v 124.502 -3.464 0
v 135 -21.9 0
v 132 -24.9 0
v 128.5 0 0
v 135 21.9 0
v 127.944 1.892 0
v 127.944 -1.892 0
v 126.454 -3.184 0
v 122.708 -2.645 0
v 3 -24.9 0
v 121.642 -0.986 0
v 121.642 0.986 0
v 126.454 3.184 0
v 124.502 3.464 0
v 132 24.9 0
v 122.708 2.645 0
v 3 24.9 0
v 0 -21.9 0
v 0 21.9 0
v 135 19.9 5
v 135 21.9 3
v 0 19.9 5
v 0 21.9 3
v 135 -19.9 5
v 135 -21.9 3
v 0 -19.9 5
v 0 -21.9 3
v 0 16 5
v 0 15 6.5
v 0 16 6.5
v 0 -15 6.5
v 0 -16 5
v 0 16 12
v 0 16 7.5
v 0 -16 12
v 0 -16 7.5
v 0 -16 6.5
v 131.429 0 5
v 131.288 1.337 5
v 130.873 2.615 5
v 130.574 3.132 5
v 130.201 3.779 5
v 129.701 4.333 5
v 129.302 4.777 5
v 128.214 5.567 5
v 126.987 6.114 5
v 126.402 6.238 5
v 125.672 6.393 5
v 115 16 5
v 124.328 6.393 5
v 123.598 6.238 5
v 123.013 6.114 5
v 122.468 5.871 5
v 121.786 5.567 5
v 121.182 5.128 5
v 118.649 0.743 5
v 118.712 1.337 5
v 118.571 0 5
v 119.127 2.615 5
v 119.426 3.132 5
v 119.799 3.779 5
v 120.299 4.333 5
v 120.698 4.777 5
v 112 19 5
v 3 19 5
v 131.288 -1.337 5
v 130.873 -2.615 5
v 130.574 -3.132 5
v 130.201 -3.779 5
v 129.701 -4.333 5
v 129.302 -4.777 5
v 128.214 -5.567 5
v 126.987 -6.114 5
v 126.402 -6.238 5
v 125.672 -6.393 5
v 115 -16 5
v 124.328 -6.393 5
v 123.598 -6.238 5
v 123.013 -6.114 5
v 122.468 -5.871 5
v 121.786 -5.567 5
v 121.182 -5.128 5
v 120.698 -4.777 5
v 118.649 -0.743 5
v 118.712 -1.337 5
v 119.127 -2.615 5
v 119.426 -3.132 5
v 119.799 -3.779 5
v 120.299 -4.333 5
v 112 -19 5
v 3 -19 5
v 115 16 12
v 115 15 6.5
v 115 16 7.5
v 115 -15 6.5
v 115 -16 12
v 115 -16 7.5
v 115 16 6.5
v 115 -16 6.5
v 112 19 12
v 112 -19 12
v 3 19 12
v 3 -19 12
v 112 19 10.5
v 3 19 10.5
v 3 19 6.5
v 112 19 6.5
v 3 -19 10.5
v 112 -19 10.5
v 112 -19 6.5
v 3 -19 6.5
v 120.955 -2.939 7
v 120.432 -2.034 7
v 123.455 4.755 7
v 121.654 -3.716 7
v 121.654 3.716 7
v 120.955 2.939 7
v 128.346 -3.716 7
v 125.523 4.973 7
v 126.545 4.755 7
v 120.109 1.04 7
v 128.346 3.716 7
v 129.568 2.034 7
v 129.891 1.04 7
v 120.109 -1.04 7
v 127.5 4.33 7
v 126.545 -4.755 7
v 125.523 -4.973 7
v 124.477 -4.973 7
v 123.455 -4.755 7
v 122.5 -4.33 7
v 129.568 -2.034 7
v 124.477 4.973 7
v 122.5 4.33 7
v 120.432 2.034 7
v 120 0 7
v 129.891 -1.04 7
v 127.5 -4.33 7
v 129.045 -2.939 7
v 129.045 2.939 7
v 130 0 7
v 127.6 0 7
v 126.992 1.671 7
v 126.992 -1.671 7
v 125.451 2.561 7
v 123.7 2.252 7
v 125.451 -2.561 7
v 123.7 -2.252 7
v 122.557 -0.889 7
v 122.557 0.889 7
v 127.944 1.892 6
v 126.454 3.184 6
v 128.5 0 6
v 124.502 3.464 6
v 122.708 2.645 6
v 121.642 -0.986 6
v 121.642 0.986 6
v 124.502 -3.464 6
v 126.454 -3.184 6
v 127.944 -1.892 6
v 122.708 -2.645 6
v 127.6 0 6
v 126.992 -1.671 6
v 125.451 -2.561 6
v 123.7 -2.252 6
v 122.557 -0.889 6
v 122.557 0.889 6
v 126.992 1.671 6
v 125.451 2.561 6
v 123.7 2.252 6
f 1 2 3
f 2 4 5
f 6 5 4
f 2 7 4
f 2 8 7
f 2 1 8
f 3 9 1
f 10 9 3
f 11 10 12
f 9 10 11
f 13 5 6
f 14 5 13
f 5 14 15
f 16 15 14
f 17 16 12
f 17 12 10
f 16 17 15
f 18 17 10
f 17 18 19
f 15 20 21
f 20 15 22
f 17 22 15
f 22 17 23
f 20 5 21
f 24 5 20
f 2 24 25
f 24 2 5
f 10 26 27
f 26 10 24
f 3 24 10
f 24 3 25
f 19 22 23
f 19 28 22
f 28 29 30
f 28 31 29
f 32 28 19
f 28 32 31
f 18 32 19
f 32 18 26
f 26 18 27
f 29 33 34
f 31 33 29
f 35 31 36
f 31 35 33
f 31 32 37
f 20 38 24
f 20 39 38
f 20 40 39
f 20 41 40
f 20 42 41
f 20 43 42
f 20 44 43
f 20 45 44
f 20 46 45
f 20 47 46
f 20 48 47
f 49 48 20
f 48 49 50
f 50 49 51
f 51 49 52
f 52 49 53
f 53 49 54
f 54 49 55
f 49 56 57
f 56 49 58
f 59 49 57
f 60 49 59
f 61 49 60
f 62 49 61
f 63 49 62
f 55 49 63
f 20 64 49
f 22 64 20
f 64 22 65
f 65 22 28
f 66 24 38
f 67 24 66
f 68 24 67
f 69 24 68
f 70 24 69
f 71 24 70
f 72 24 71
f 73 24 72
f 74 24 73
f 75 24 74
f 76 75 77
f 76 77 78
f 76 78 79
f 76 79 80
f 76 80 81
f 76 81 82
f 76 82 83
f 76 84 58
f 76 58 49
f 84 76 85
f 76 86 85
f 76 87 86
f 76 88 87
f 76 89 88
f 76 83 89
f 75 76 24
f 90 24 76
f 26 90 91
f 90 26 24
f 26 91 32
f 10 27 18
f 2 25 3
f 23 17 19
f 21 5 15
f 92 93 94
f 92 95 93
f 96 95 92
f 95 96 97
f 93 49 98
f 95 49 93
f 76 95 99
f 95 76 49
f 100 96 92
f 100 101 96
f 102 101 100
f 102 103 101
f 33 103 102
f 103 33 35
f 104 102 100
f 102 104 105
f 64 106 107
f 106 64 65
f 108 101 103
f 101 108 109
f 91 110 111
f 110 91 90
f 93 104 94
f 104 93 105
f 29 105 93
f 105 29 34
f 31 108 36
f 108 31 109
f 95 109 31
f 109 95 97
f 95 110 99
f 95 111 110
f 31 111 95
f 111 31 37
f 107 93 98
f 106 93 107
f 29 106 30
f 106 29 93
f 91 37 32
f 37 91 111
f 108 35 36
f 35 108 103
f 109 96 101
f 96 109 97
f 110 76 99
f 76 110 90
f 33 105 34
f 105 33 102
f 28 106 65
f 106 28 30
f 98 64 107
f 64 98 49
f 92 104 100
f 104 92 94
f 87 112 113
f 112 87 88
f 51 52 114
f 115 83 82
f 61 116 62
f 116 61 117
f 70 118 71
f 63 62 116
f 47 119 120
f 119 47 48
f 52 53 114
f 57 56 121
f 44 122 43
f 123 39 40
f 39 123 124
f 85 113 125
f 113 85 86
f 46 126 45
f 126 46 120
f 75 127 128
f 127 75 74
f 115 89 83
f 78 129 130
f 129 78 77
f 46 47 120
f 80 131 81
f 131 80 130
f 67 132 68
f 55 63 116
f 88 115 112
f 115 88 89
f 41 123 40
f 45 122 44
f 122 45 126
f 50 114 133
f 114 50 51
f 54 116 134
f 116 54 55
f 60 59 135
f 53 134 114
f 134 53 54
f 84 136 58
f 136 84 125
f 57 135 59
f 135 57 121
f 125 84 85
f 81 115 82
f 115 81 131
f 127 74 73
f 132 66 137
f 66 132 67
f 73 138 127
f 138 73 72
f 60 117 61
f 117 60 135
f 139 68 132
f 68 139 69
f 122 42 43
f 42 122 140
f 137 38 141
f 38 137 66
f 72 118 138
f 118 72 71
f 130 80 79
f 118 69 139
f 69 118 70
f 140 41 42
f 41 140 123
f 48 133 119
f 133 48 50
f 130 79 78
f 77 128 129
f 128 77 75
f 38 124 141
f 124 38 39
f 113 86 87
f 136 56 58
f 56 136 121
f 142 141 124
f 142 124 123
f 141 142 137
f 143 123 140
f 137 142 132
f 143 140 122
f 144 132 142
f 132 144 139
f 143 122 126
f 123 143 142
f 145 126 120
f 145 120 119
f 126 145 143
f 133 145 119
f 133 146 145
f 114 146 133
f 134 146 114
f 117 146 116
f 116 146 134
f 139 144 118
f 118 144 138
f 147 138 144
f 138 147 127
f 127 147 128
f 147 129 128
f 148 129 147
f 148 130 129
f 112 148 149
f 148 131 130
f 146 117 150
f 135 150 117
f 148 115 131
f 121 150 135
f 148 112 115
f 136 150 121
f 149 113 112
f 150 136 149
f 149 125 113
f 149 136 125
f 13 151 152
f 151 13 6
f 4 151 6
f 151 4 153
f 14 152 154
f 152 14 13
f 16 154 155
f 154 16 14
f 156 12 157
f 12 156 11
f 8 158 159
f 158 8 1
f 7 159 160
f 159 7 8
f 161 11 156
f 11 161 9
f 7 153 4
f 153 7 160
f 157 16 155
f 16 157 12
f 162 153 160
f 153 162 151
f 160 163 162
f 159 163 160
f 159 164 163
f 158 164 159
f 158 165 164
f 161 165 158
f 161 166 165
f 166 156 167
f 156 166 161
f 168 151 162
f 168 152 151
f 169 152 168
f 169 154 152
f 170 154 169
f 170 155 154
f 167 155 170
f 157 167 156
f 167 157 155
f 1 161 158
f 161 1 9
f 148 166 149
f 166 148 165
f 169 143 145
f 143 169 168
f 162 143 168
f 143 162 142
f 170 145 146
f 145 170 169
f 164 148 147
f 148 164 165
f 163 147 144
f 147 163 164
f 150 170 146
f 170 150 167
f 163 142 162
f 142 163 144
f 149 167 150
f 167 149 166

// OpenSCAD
// file: config_4x5.scad
/*
This is the base configuration file for the 4x5" format
# we are not using the exact ANSI measures, but slightly rounded measures for slight simplification
*/
vStabilizerTotal_h = 7;

// general tolerance
vTolerance = 0.2;

// sheet film and cassette measurements (roughly based on the ANSI measurements)
vFilmSheet_l = 127;
vFilmSheet_w = 102;
vCassette_l = 160; // A min
vCassette_w = 121; // B max
vCassette_h = 13.2; // C max
vLightTrap_l = 2; // M2
vLightTrap_w = vCassette_w;
vLightTrap_h = 1.5; // M1
vLightTrap_offsetX = 141; // G max
vFilmWindow_l = 121;
vFilmWindow_w = 101;
vFilmWindow_offsetX = 16;
vGroundGlass_offsetZ = 5;

// Graflok
vGraflok_h = 6; // this is not the official measurement, just measured from a camera 

// lens board measures (we are using Wista/Technika-style lensboards)
vLensboard_l = 100;
vLensboard_w = 97;
vLensboard_h = 2;
vLensboard_offsetX = -(vLensboard_l+3)/2; // caution: we have an asymetric offset!
vLensboard_offsetY = -vLensboard_w/2;
vLensboardHole_d = 85;
vLensboardLighttrap_d = 89;
vLensboardLighttrap_h = 1+vTolerance;

// bellows frame measures - the bellows frame design is derived from standardcameras.com
// back frame
vBellowsBackInner_l = 144; //???? check and replace with the measurement from your bellows!
vBellowsBackInner_w = vBellowsBackInner_l;
vBellowsBackOuter_l = vBellowsBackInner_l+1;
vBellowsBackOuter_w = vBellowsBackOuter_l;

vBellowsBackFrameOuter_l = 159;
vBellowsBackFrameOuter_w = vBellowsBackFrameOuter_l;
vBellowsBackFrameOuter_h = 7;
vBellowsBackFrameInner_l = 135;
vBellowsBackFrameInner_w = vBellowsBackFrameInner_l;
vBellowsBackFrameInner_h = 5;

vBellowsBackLightTrapOuter_l = vBellowsBackFrameInner_l+2*2;
vBellowsBackLightTrapOuter_w = vBellowsBackLightTrapOuter_l;
vBellowsBackLightTrap_h = 3;

vBellowsBackFrameScrewHole_d = 2;
vBellowsBackFrameScrewHole_h = 10;
vBellowsBackFrameScrewHole_offsetXY = 70;
vBellowsBackFrameScrewHole_offsetZ = vBellowsBackFrameOuter_h/2;

// front frame
vBellowsFrontInner_l = 94; //???? check and replace with the measurement from your bellows!
vBellowsFrontInner_w = vBellowsFrontInner_l;
vBellowsFrontOuter_l = vBellowsFrontInner_l+1;
vBellowsFrontOuter_w = vBellowsFrontOuter_l;

vBellowsFrontFrameOuter_l = 104;
vBellowsFrontFrameOuter_w = vBellowsFrontFrameOuter_l;
vBellowsFrontFrameOuter_h = 7;
vBellowsFrontFrameInner_l = 82;
vBellowsFrontFrameInner_w = vBellowsFrontFrameInner_l;
vBellowsFrontFrameInner_h = 5;

vBellowsFrontLightTrapOuter_l = vBellowsFrontFrameInner_l+2*2;
vBellowsFrontLightTrapOuter_w = vBellowsFrontLightTrapOuter_l;
vBellowsFrontLightTrap_h = 0;

vBellowsFrontFrameScrewHole_d = 2;
vBellowsFrontFrameScrewHole_h = 10;
vBellowsFrontFrameScrewHole_offsetXY = 40;
vBellowsFrontFrameScrewHole_offsetZ = vBellowsFrontFrameOuter_h/2;

// body dimensions
vWall_strength = 5;
vBodyOuter_l = 185; // make sure this is at least 4*vWall_strength larger than vBellowsBackFrameOuter_l!
vBodyOuter_w = 170; // make sure this is at least 2*vWall_strength larger than vBellowsBackFrameOuter_l!
vBodyOuter_h = 65;
vBodyEdge_r = vWall_strength;

// we will center our model on the Y axis and on the center of the bellows frame
// at least for the 4x5 version, we have to do an asymetric offset of 2.5mm on the X-axis 
vAsymOffsetX = -2.5;  

// back plate
vBackPlateLength = 160; // we will probably use about the same size as the bellows back frame
vBackPlateStrength = vWall_strength;

// hinges for front lid
vHingeInnerDistance = 100;
vHingeBaseWidth = 20;
vHingeHole = 5;

// lid lock measures
vLidLockBase_d = 8;
vLidLockHole_distance = 70;

// rail dimensions
vLowerRail_w = 90;
vUpperRail_w = vLowerRail_w;

// cutout for stop indents
vStopIndent_l = 4;
vStopIndent_h = 5;
vStopIndentDistance = 25; // shorter than 25 is not necessary
vStopIndent_offsetX = 20; // don't go shorter than 20 if you intend to use a 90mm lens!

// for all dovetails we use a base width of 5mm and a base height of 5mm
// we are applying tolerances to the inner AND outer part of a dovetail, in width and height
vDoveTail_w = 5;
vDoveTail_h = 5;
vDoveTail_tolerance = 0.2;

// front standard carrier / slider
// width is depending on vUpperRail_w
vSliderBase_w = vUpperRail_w + (4*vDoveTail_w);
vSliderBase_l = 40; // make sure to have enough space in the body.


// lever plate 
vLeverPlateBase_w = vUpperRail_w - (8*vDoveTail_w);
vLeverPlateBlock_w = 25;
vLeverPlateBlock_l = vSliderBase_l-(2*vDoveTail_w);

vFrontStandard_h = 130;
vFrontStandardSlot_h = vFrontStandard_h - 30;

// lensboard carrier
vFrontPlate_length = vSliderBase_w+6; // vSliderBase_w is a bit too tight for 4x5", so there we will add 5mm, for 5x7 vSliderBase_w is OK to get a squared lensboard carrier
vFrontPlate_width = vSliderBase_w; //vFrontPlate_length;
vFrontPlate_height = 16;
vEdgeCutCylinder = floor(sqrt(2*pow(vFrontPlate_width,2)))-5;

vTiltDovetailBase_d1 = 30;
vTiltDovetailBase_d2 = vTiltDovetailBase_d1+(2*vDoveTail_w);
vTiltDovetailBaseBlock_d = vTiltDovetailBase_d1+(4*vDoveTail_w);

vTiltDovetail_d1 = vTiltDovetailBase_d1-vTolerance;
vTiltDovetail_d2 = vTiltDovetailBase_d2-vTolerance;
vTiltDovetail_h = vDoveTail_w-vTolerance;

vTiltDovetailCutout_d1 = vTiltDovetailBase_d2+vTolerance;
vTiltDovetailCutout_d2 = vTiltDovetailBase_d1+vTolerance;

vAxisHole_d = 10+vTolerance;
vAxisHole_h = vDoveTail_w+vTolerance;

vTiltLockBolt_d = 12;
vTiltLockBolt_h = 14;
vTiltLockBoltHole_d = 8;
vTiltLockBoltHole_h = vTiltLockBolt_h;

vTiltHeight = 50;
vTiltRadius = vFrontPlate_length/2;
vTiltAngleMinus = -7;
vTiltAnglePlus = 7;
vTiltAxis_d = 10-vTolerance;

// focusing rod
vFocusingRod_d = 6;
vFocusingKnob_d = 25;
vFocusingKnob_h = 20;

// stabilizer measures (just the outer measures of our stabilizer block, not the tripod slider)
vStabilizerBase_l = 135;
vStabilizerBase_w = 90;  
vStabilizerBase_h = 7;
vStabilizerDovetailBase_w = 50;
// screw holes for the stabilizer
vLidHoleCount_x = 4;
vLidHoleDist_x = 35;
vLidHoleCount_y = 2;
vLidHoleDist_y = 60;


// screw diameters, length is individually set
vScrew1Hole_d = 3;
vScrew1ThreadHole_d = 2.2;
vScrew2Hole_d = 2;
vScrew2ThreadHole_d = 1.4;


 
// file: modules.scad
/*
This is a collection of the modules which are used heavily within the whole project.
Almost all parts rely on the modules to remain "as is", especially regarding their current orientation.
So please act very carefully here, otherwise you may screw up the complete design!

*/
include <baseconfig.scad>;


// roof module - this is heavily used for dovetail cutouts
// please keep as is
module roof(l, w, h){
    polyhedron(
        points=[
            [0,0,0],
            [l,0,0],
            [l,w,0],
            [0,w,0],
            [0,w/2,h],
            [l,w/2,h]
            ],
        faces=[
            [0,1,2,3],
            [0,4,1],
            [1,4,5,2],
            [2,5,3],
            [3,5,4,0]
            ]
            );
    };

// a wedge module - this is heavily used for cutting edges
// please keep as is    
module wedge(l, w, h) {
    polyhedron(
            points=[
                [0,0,0],
                [l,0,0],
                [l,w,0],
                [0,w,0],
                [0,0,h],
                [l,0,h]
            ],
            faces=[
                [0,3,2,1],
                [0,1,5,4],
                [1,2,5],
                [2,3,4,5],
                [3,0,4]
            ]
    );
   };

// simple tube module.   
module tube(d1, d2, h) {
    difference() {
        cylinder(d=d1, h=h);
        cylinder(d=d2, h=h);
        };
    };

// mainly used for making holes for countersunk screws
// please keep as is    
module countersunk_screw(vScrew_d, vScrew_l){
    union(){
    cylinder(d=vScrew_d, h=vScrew_l);
    cylinder(d1=vScrew_d*2, d2=0, h=vScrew_d);
    };
};

// module for making hexagons, e.g. hex nuts. kw is the key width
// please keep as is
module hex(kw, h) {
	render()
        translate([0, 0, h/2])
            intersection_for(a = [0, 120, 240]) {
                rotate([0, 0, a])
                    cube([kw, 3 * kw, h], true);
                }
}


// Heatset insert
// d: Thread diameter
// od: Outer diameter
// l: Total length
module insert(d, od, l)
{
    echo(Insert = d, od, l);
    difference() {
        cylinder(l, d=od, $fn=15);
        translate([0, 0, -0.5]) cylinder(l+1, d=d, $fn=15);
        };
}

module insert_m2()
{
    color("gold") insert(2, vInsertM2Size_d, vInsertM2Depth_h);
}

module insert_m3()
{
    color("gold") insert(3, vInsertM3Size_d, vInsertM3Depth_h);
}

module insert_m5()
{
    color("gold") insert(5, vInsertM5Size_d, vInsertM5Depth_h);
}

// Countersunk screw, metric, for display
// Example: https://www.aliexpress.com/item/1005007838338973.html
module screw_cs(l, d=3, dk=6, s=2, t=1) {
    // l: total length (including head) in mm
    // d: thread diameter (eg 3 for M3)
    // dk: max head diameter
    // s: hex socket flat-to-flat size
    // t: hex socket depth
    echo(CountersunkScrew = d, l);
    difference() {
        union() {
            cylinder(h=l, r=d/2, $fn=15);
            cylinder(h=(dk-d)/2, r1=dk/2, r2=d/2, $fn=15);
            }
        cylinder(h=t, r=s/2*2/sqrt(3), $fn=6);
    }
}

module screw_m3_cs(l) {
    color("silver") screw_cs(l, d=3, dk=6, s=2, t=1);
}

module screw_m2_cs(l) {
    color("silver") screw_cs(l, d=2, dk=3.8, s=1.5, t=0.75);
}
module screw_m5_cs(l) {
    color("silver") screw_cs(l, d=5, dk=9.5, s=3, t=1.6);
}

// Button head screw, metric, for display
// Example: https://www.aliexpress.com/item/32967225441.html
module screw_bh(l, d=3, k=1.5, dk=5.5, s=2, t=1) {
    // l: shaft length (NOT including head) in mm
    // d: thread diameter (eg 3 for M3)
    // k: head depth
    // dk: head max diameter
    // s: hex socket flat-to-flat size
    // t: hex socket depth
    echo(BallheadScrew = d, l);
    difference() {
        union() {
            translate([0, 0, k]) cylinder(h=l, r=d/2, $fn=15);
            difference() {
                translate([0, 0, k]) intersection() {
                    sphere(d=dk, $fn=15);
                    translate([-dk/2, -dk/2, -dk]) cube(dk);
                }
                translate([-dk/2, -dk/2, -dk]) cube(dk);
            }
        }
        cylinder(h=t, r=s/2*2/sqrt(3), $fn=6);
    }
}

module screw_m2_bh(l) {
    color("silver") screw_bh(l, d=2, dk=3.4, s=1.175, t=0.6);
}

module screw_m3_bh(l) {
    color("silver") screw_bh(l, d=3, dk=5.7, s=2, t=1);
}


module nut_m5() {
    echo(Nut = 5);
    difference() {
        rotate([0, 0, 30]) cylinder(h=3.9, d=8*2/sqrt(3), $fn=6);
        cylinder(h=5, d=5, $fn=15);
        }
    }
    
    
module thumbscrew(bolt_d, bolt_dk, screw_d, screw_h, n_knurls, knurl_d, knurl_f) {
    // bolt_d:  central bolt diameter
    // bolt_dk: bolt head max diameter
    // screw_d: thumbscrew outer diameter
    // screw_h: thumbscrew height
    // n_knurls: number of knurls
    
    min_knurl_offset = screw_d/2 - knurl_d;
    max_knurl_offset = screw_d/2 + knurl_d;
    knurl_offset = min_knurl_offset + knurl_f*(max_knurl_offset - min_knurl_offset);
    
    difference()
    {
        union()
        {
            translate([0, 0, 1]) cylinder(screw_h-2, d=screw_d);
            cylinder(1, d1=screw_d-1, d2=screw_d);
            translate([0, 0, screw_h-1]) cylinder(1, d1=screw_d, d2=screw_d-1);
        }
        cylinder(screw_h, d=bolt_d);
        cylinder(bolt_dk/2, d1=bolt_dk, d2=0);
        for (i = [1:n_knurls])
        {
            rotate([0, 0, i*360/(n_knurls)]) translate([knurl_offset, 0, 0]) cylinder(screw_h, d=knurl_d);
        }
    }
}

module thumbscrew_m5(screw_d, screw_h, n_knurls, knurl_d, knurl_f) {
    thumbscrew(5, 9.5, screw_d, screw_h, n_knurls, knurl_d, knurl_f);
}


module t6_flange_coupler() {
    // T6 flange coupler
    // Example: https://www.aliexpress.com/item/1005008049363389.html
    echo(FlangeCoupler = 6);
    difference() {
        union() {
            translate([0, 0, 2]) cylinder(h=10, d=10);
            cylinder(h=2, d=22);
        }
        cylinder(h=12, d=6);
        translate([0, 15, 7]) rotate([90, 0, 0]) cylinder(h=30, d=3);
        for (i = [0:3]) {
            rotate([0, 0, 45+90*i]) translate([-8, 0, 0]) cylinder(h=2, d=3);
        }
    }
}


module AXK0619_thrust_bearing() {
    echo(ThrustBearing = "AXK0619");
    difference() {
        cylinder(h=4, d=19);
        cylinder(h=4, d=6);
    }
}


module t6_lead_screw(l) {
    echo(LeadScrewT6 = l);
    color("silver") cylinder(h=l, d=6);
}

module t6_lead_screw_nut() {
    echo("LeadScrewT6Nut");
    intersection()
    {
        difference() {
            union() {
                cylinder(h=15, d=12);
                translate([0, 0, 1.5]) cylinder(h=3.5, d=24);
            }
            cylinder(h=15, d=6);
        }  
        translate([-50, -12.5/2, -50]) cube([100, 12.5, 100]);
    }
}

module m5_rod(l) {
    echo(ThreadedRodM5 = l);
    color("silver") cylinder(h=l, d=5);
}


module screw_m3_grub(l) {
    echo(GrubScrew = 3, l);
    cylinder(h=l, d=3, $fn=15);
}
// file: baseconfig.scad
/*
Here we define some variables which are independent from the camera format
*/


// some generic variables

// we are including a format specific configuration sheet - but make sure to include only one!

include <config_4x5.scad>;
// include <config_5x7.scad>;
// include <config_8x10.scad>;

// Arca Swiss tripod plate
// caution: some Arca Swiss compatible tripod heads may have slight variations
// vArca_length = xx; // the length is irrelevant here
vArca_width = 38;
vArca_height = 7;
vArcaBase_cutout = 4;
vArcaBase_height = 1.5;
// main file
// loading the base configuration
include <baseconfig.scad>;

// some modules such as hex, countersunk screws, roof, wedge are available in a module file
use <modules.scad>;


module tripod_plate()
{

vTotalPlate_length = vStabilizerBase_l;
vTotalPlate_height = 12;

vDovetail_length = vTotalPlate_length;
vDovetailOuter_width = vStabilizerDovetailBase_w-vDoveTail_tolerance;
vDovetailInner_width = vDovetailOuter_width-(2*vDoveTail_w);
vDovetail_height = vDoveTail_h;
vDovetail_offsetX = 0;
vDovetail_offsetY = -vDovetailOuter_width/2;
vDovetail_offsetZ = 0;

vDovetailEdgeCutoff = 3;

vArca_length = vTotalPlate_length-20;
vArca_width = 38;
vArca_height = 7;
vArcaBase_cutout = 4;
vArcaBase_height = 1.5;
vArca_offsetX = 0;
vArca_offsetY = -vArca_width/2;
vArca_offsetZ = vDovetail_height+vArca_height;

vArcaEdgeCutoff = 3;


vLockingCylinder_d1 = 20;
vLockingCylinder_d2 = 10;
vLockingCylinder_h = 7;
vLockingCylinder_offsetX = vTotalPlate_length-10;
vLockingCylinder_offsetY = 0;
vLockingCylinder_offsetZ = 0;

// we are using a M5x6x7 thread nut!
vLockingThreadHole_d = 7;
vLockingThreadHole_h = 6;
vLockingThreadHole_offsetX = vLockingCylinder_offsetX;
vLockingThreadHole_offsetY = vLockingCylinder_offsetY;
vLockingThreadHole_offsetZ = vLockingCylinder_offsetZ;

vLockingHole_d = 5.2;
vLockingHole_h = vTotalPlate_height;
vLockingHole_offsetX = vLockingCylinder_offsetX;
vLockingHole_offsetY = vLockingCylinder_offsetY;
vLockingHole_offsetZ = vLockingCylinder_offsetZ;

difference(){
    union(){
        // Dovetail plate
        translate([vDovetail_offsetX, vDovetail_offsetY, vDovetail_offsetZ])
            difference(){
                intersection(){
                    roof(vDovetail_length, vDovetailOuter_width, vDovetailOuter_width/2);
                    cube([vDovetail_length, vDovetailOuter_width, vDovetail_height]);
                };
                // cut off dovetail edges
                translate([0, 0, 0])
                    rotate([0, 270, 0])
                        wedge(vDovetail_height, vDovetailEdgeCutoff, -vDovetailEdgeCutoff);
                translate([vDovetail_length, 0, 0])
                    rotate([0, 270, 0])
                        wedge(vDovetail_height, vDovetailEdgeCutoff, vDovetailEdgeCutoff);
                translate([0, vDovetailOuter_width, 0])
                    rotate([0, 270, 0])
                        wedge(vDovetail_height, -vDovetailEdgeCutoff, -vDovetailEdgeCutoff);
                translate([vDovetail_length, vDovetailOuter_width, 0])
                    rotate([0, 270, 0])
                        wedge(vDovetail_height, -vDovetailEdgeCutoff, vDovetailEdgeCutoff);
                
            };
        
        // Arca plate    
        translate([vArca_offsetX, vArca_offsetY, vArca_offsetZ])
            mirror([0,0,1])
                difference(){
                    union(){
                        cube([vArca_length, vArca_width, vArcaBase_height ]);
                        translate([0, 0, vArcaBase_height])
                            roof(vArca_length, vArca_width, vArca_width/2);
                        translate([0,0,vArcaBase_height+vArcaBase_cutout])
                            cube([vArca_length, vArca_width, vArca_width]);
                    };
                    translate([0,0,vArca_height])
                        cube([vArca_length, vArca_width, vArca_width]);
                    
                    // cut off edges
                    translate([0, 0, 0])
                        rotate([0, 270, 0])
                            wedge( vArca_height, vArcaEdgeCutoff, -vArcaEdgeCutoff);
                    
                    translate([vArca_length, 0, 0])
                        rotate([0, 270, 0])
                         wedge(vArca_height, vArcaEdgeCutoff, vArcaEdgeCutoff);
                    
                    translate([0, vArca_width, 0])
                        rotate([0, 270, 0])
                            wedge(vArca_height, -vArcaEdgeCutoff, -vArcaEdgeCutoff);
                    
                    translate([vArca_length, vArca_width, 0])
                        rotate([0, 270, 0])
                            wedge(vArca_height, -vArcaEdgeCutoff, vArcaEdgeCutoff);
                    
                };
        
        // Cylinder for locking mechanism
        translate([vLockingCylinder_offsetX, vLockingCylinder_offsetY, vLockingCylinder_offsetZ])
            cylinder(d1=vLockingCylinder_d1, d2=vLockingCylinder_d2, h=vLockingCylinder_h);
                
    };
    // Hole for thread nut
        translate([vLockingThreadHole_offsetX, vLockingThreadHole_offsetY, vLockingThreadHole_offsetZ])
            cylinder(d=vLockingThreadHole_d, h=vLockingThreadHole_h);
    
    // ScrewHole
        translate([vLockingHole_offsetX, vLockingHole_offsetY, vLockingHole_offsetZ])
            cylinder(d=vLockingHole_d, h=vLockingHole_h);
    
};

};

tripod_plate();
